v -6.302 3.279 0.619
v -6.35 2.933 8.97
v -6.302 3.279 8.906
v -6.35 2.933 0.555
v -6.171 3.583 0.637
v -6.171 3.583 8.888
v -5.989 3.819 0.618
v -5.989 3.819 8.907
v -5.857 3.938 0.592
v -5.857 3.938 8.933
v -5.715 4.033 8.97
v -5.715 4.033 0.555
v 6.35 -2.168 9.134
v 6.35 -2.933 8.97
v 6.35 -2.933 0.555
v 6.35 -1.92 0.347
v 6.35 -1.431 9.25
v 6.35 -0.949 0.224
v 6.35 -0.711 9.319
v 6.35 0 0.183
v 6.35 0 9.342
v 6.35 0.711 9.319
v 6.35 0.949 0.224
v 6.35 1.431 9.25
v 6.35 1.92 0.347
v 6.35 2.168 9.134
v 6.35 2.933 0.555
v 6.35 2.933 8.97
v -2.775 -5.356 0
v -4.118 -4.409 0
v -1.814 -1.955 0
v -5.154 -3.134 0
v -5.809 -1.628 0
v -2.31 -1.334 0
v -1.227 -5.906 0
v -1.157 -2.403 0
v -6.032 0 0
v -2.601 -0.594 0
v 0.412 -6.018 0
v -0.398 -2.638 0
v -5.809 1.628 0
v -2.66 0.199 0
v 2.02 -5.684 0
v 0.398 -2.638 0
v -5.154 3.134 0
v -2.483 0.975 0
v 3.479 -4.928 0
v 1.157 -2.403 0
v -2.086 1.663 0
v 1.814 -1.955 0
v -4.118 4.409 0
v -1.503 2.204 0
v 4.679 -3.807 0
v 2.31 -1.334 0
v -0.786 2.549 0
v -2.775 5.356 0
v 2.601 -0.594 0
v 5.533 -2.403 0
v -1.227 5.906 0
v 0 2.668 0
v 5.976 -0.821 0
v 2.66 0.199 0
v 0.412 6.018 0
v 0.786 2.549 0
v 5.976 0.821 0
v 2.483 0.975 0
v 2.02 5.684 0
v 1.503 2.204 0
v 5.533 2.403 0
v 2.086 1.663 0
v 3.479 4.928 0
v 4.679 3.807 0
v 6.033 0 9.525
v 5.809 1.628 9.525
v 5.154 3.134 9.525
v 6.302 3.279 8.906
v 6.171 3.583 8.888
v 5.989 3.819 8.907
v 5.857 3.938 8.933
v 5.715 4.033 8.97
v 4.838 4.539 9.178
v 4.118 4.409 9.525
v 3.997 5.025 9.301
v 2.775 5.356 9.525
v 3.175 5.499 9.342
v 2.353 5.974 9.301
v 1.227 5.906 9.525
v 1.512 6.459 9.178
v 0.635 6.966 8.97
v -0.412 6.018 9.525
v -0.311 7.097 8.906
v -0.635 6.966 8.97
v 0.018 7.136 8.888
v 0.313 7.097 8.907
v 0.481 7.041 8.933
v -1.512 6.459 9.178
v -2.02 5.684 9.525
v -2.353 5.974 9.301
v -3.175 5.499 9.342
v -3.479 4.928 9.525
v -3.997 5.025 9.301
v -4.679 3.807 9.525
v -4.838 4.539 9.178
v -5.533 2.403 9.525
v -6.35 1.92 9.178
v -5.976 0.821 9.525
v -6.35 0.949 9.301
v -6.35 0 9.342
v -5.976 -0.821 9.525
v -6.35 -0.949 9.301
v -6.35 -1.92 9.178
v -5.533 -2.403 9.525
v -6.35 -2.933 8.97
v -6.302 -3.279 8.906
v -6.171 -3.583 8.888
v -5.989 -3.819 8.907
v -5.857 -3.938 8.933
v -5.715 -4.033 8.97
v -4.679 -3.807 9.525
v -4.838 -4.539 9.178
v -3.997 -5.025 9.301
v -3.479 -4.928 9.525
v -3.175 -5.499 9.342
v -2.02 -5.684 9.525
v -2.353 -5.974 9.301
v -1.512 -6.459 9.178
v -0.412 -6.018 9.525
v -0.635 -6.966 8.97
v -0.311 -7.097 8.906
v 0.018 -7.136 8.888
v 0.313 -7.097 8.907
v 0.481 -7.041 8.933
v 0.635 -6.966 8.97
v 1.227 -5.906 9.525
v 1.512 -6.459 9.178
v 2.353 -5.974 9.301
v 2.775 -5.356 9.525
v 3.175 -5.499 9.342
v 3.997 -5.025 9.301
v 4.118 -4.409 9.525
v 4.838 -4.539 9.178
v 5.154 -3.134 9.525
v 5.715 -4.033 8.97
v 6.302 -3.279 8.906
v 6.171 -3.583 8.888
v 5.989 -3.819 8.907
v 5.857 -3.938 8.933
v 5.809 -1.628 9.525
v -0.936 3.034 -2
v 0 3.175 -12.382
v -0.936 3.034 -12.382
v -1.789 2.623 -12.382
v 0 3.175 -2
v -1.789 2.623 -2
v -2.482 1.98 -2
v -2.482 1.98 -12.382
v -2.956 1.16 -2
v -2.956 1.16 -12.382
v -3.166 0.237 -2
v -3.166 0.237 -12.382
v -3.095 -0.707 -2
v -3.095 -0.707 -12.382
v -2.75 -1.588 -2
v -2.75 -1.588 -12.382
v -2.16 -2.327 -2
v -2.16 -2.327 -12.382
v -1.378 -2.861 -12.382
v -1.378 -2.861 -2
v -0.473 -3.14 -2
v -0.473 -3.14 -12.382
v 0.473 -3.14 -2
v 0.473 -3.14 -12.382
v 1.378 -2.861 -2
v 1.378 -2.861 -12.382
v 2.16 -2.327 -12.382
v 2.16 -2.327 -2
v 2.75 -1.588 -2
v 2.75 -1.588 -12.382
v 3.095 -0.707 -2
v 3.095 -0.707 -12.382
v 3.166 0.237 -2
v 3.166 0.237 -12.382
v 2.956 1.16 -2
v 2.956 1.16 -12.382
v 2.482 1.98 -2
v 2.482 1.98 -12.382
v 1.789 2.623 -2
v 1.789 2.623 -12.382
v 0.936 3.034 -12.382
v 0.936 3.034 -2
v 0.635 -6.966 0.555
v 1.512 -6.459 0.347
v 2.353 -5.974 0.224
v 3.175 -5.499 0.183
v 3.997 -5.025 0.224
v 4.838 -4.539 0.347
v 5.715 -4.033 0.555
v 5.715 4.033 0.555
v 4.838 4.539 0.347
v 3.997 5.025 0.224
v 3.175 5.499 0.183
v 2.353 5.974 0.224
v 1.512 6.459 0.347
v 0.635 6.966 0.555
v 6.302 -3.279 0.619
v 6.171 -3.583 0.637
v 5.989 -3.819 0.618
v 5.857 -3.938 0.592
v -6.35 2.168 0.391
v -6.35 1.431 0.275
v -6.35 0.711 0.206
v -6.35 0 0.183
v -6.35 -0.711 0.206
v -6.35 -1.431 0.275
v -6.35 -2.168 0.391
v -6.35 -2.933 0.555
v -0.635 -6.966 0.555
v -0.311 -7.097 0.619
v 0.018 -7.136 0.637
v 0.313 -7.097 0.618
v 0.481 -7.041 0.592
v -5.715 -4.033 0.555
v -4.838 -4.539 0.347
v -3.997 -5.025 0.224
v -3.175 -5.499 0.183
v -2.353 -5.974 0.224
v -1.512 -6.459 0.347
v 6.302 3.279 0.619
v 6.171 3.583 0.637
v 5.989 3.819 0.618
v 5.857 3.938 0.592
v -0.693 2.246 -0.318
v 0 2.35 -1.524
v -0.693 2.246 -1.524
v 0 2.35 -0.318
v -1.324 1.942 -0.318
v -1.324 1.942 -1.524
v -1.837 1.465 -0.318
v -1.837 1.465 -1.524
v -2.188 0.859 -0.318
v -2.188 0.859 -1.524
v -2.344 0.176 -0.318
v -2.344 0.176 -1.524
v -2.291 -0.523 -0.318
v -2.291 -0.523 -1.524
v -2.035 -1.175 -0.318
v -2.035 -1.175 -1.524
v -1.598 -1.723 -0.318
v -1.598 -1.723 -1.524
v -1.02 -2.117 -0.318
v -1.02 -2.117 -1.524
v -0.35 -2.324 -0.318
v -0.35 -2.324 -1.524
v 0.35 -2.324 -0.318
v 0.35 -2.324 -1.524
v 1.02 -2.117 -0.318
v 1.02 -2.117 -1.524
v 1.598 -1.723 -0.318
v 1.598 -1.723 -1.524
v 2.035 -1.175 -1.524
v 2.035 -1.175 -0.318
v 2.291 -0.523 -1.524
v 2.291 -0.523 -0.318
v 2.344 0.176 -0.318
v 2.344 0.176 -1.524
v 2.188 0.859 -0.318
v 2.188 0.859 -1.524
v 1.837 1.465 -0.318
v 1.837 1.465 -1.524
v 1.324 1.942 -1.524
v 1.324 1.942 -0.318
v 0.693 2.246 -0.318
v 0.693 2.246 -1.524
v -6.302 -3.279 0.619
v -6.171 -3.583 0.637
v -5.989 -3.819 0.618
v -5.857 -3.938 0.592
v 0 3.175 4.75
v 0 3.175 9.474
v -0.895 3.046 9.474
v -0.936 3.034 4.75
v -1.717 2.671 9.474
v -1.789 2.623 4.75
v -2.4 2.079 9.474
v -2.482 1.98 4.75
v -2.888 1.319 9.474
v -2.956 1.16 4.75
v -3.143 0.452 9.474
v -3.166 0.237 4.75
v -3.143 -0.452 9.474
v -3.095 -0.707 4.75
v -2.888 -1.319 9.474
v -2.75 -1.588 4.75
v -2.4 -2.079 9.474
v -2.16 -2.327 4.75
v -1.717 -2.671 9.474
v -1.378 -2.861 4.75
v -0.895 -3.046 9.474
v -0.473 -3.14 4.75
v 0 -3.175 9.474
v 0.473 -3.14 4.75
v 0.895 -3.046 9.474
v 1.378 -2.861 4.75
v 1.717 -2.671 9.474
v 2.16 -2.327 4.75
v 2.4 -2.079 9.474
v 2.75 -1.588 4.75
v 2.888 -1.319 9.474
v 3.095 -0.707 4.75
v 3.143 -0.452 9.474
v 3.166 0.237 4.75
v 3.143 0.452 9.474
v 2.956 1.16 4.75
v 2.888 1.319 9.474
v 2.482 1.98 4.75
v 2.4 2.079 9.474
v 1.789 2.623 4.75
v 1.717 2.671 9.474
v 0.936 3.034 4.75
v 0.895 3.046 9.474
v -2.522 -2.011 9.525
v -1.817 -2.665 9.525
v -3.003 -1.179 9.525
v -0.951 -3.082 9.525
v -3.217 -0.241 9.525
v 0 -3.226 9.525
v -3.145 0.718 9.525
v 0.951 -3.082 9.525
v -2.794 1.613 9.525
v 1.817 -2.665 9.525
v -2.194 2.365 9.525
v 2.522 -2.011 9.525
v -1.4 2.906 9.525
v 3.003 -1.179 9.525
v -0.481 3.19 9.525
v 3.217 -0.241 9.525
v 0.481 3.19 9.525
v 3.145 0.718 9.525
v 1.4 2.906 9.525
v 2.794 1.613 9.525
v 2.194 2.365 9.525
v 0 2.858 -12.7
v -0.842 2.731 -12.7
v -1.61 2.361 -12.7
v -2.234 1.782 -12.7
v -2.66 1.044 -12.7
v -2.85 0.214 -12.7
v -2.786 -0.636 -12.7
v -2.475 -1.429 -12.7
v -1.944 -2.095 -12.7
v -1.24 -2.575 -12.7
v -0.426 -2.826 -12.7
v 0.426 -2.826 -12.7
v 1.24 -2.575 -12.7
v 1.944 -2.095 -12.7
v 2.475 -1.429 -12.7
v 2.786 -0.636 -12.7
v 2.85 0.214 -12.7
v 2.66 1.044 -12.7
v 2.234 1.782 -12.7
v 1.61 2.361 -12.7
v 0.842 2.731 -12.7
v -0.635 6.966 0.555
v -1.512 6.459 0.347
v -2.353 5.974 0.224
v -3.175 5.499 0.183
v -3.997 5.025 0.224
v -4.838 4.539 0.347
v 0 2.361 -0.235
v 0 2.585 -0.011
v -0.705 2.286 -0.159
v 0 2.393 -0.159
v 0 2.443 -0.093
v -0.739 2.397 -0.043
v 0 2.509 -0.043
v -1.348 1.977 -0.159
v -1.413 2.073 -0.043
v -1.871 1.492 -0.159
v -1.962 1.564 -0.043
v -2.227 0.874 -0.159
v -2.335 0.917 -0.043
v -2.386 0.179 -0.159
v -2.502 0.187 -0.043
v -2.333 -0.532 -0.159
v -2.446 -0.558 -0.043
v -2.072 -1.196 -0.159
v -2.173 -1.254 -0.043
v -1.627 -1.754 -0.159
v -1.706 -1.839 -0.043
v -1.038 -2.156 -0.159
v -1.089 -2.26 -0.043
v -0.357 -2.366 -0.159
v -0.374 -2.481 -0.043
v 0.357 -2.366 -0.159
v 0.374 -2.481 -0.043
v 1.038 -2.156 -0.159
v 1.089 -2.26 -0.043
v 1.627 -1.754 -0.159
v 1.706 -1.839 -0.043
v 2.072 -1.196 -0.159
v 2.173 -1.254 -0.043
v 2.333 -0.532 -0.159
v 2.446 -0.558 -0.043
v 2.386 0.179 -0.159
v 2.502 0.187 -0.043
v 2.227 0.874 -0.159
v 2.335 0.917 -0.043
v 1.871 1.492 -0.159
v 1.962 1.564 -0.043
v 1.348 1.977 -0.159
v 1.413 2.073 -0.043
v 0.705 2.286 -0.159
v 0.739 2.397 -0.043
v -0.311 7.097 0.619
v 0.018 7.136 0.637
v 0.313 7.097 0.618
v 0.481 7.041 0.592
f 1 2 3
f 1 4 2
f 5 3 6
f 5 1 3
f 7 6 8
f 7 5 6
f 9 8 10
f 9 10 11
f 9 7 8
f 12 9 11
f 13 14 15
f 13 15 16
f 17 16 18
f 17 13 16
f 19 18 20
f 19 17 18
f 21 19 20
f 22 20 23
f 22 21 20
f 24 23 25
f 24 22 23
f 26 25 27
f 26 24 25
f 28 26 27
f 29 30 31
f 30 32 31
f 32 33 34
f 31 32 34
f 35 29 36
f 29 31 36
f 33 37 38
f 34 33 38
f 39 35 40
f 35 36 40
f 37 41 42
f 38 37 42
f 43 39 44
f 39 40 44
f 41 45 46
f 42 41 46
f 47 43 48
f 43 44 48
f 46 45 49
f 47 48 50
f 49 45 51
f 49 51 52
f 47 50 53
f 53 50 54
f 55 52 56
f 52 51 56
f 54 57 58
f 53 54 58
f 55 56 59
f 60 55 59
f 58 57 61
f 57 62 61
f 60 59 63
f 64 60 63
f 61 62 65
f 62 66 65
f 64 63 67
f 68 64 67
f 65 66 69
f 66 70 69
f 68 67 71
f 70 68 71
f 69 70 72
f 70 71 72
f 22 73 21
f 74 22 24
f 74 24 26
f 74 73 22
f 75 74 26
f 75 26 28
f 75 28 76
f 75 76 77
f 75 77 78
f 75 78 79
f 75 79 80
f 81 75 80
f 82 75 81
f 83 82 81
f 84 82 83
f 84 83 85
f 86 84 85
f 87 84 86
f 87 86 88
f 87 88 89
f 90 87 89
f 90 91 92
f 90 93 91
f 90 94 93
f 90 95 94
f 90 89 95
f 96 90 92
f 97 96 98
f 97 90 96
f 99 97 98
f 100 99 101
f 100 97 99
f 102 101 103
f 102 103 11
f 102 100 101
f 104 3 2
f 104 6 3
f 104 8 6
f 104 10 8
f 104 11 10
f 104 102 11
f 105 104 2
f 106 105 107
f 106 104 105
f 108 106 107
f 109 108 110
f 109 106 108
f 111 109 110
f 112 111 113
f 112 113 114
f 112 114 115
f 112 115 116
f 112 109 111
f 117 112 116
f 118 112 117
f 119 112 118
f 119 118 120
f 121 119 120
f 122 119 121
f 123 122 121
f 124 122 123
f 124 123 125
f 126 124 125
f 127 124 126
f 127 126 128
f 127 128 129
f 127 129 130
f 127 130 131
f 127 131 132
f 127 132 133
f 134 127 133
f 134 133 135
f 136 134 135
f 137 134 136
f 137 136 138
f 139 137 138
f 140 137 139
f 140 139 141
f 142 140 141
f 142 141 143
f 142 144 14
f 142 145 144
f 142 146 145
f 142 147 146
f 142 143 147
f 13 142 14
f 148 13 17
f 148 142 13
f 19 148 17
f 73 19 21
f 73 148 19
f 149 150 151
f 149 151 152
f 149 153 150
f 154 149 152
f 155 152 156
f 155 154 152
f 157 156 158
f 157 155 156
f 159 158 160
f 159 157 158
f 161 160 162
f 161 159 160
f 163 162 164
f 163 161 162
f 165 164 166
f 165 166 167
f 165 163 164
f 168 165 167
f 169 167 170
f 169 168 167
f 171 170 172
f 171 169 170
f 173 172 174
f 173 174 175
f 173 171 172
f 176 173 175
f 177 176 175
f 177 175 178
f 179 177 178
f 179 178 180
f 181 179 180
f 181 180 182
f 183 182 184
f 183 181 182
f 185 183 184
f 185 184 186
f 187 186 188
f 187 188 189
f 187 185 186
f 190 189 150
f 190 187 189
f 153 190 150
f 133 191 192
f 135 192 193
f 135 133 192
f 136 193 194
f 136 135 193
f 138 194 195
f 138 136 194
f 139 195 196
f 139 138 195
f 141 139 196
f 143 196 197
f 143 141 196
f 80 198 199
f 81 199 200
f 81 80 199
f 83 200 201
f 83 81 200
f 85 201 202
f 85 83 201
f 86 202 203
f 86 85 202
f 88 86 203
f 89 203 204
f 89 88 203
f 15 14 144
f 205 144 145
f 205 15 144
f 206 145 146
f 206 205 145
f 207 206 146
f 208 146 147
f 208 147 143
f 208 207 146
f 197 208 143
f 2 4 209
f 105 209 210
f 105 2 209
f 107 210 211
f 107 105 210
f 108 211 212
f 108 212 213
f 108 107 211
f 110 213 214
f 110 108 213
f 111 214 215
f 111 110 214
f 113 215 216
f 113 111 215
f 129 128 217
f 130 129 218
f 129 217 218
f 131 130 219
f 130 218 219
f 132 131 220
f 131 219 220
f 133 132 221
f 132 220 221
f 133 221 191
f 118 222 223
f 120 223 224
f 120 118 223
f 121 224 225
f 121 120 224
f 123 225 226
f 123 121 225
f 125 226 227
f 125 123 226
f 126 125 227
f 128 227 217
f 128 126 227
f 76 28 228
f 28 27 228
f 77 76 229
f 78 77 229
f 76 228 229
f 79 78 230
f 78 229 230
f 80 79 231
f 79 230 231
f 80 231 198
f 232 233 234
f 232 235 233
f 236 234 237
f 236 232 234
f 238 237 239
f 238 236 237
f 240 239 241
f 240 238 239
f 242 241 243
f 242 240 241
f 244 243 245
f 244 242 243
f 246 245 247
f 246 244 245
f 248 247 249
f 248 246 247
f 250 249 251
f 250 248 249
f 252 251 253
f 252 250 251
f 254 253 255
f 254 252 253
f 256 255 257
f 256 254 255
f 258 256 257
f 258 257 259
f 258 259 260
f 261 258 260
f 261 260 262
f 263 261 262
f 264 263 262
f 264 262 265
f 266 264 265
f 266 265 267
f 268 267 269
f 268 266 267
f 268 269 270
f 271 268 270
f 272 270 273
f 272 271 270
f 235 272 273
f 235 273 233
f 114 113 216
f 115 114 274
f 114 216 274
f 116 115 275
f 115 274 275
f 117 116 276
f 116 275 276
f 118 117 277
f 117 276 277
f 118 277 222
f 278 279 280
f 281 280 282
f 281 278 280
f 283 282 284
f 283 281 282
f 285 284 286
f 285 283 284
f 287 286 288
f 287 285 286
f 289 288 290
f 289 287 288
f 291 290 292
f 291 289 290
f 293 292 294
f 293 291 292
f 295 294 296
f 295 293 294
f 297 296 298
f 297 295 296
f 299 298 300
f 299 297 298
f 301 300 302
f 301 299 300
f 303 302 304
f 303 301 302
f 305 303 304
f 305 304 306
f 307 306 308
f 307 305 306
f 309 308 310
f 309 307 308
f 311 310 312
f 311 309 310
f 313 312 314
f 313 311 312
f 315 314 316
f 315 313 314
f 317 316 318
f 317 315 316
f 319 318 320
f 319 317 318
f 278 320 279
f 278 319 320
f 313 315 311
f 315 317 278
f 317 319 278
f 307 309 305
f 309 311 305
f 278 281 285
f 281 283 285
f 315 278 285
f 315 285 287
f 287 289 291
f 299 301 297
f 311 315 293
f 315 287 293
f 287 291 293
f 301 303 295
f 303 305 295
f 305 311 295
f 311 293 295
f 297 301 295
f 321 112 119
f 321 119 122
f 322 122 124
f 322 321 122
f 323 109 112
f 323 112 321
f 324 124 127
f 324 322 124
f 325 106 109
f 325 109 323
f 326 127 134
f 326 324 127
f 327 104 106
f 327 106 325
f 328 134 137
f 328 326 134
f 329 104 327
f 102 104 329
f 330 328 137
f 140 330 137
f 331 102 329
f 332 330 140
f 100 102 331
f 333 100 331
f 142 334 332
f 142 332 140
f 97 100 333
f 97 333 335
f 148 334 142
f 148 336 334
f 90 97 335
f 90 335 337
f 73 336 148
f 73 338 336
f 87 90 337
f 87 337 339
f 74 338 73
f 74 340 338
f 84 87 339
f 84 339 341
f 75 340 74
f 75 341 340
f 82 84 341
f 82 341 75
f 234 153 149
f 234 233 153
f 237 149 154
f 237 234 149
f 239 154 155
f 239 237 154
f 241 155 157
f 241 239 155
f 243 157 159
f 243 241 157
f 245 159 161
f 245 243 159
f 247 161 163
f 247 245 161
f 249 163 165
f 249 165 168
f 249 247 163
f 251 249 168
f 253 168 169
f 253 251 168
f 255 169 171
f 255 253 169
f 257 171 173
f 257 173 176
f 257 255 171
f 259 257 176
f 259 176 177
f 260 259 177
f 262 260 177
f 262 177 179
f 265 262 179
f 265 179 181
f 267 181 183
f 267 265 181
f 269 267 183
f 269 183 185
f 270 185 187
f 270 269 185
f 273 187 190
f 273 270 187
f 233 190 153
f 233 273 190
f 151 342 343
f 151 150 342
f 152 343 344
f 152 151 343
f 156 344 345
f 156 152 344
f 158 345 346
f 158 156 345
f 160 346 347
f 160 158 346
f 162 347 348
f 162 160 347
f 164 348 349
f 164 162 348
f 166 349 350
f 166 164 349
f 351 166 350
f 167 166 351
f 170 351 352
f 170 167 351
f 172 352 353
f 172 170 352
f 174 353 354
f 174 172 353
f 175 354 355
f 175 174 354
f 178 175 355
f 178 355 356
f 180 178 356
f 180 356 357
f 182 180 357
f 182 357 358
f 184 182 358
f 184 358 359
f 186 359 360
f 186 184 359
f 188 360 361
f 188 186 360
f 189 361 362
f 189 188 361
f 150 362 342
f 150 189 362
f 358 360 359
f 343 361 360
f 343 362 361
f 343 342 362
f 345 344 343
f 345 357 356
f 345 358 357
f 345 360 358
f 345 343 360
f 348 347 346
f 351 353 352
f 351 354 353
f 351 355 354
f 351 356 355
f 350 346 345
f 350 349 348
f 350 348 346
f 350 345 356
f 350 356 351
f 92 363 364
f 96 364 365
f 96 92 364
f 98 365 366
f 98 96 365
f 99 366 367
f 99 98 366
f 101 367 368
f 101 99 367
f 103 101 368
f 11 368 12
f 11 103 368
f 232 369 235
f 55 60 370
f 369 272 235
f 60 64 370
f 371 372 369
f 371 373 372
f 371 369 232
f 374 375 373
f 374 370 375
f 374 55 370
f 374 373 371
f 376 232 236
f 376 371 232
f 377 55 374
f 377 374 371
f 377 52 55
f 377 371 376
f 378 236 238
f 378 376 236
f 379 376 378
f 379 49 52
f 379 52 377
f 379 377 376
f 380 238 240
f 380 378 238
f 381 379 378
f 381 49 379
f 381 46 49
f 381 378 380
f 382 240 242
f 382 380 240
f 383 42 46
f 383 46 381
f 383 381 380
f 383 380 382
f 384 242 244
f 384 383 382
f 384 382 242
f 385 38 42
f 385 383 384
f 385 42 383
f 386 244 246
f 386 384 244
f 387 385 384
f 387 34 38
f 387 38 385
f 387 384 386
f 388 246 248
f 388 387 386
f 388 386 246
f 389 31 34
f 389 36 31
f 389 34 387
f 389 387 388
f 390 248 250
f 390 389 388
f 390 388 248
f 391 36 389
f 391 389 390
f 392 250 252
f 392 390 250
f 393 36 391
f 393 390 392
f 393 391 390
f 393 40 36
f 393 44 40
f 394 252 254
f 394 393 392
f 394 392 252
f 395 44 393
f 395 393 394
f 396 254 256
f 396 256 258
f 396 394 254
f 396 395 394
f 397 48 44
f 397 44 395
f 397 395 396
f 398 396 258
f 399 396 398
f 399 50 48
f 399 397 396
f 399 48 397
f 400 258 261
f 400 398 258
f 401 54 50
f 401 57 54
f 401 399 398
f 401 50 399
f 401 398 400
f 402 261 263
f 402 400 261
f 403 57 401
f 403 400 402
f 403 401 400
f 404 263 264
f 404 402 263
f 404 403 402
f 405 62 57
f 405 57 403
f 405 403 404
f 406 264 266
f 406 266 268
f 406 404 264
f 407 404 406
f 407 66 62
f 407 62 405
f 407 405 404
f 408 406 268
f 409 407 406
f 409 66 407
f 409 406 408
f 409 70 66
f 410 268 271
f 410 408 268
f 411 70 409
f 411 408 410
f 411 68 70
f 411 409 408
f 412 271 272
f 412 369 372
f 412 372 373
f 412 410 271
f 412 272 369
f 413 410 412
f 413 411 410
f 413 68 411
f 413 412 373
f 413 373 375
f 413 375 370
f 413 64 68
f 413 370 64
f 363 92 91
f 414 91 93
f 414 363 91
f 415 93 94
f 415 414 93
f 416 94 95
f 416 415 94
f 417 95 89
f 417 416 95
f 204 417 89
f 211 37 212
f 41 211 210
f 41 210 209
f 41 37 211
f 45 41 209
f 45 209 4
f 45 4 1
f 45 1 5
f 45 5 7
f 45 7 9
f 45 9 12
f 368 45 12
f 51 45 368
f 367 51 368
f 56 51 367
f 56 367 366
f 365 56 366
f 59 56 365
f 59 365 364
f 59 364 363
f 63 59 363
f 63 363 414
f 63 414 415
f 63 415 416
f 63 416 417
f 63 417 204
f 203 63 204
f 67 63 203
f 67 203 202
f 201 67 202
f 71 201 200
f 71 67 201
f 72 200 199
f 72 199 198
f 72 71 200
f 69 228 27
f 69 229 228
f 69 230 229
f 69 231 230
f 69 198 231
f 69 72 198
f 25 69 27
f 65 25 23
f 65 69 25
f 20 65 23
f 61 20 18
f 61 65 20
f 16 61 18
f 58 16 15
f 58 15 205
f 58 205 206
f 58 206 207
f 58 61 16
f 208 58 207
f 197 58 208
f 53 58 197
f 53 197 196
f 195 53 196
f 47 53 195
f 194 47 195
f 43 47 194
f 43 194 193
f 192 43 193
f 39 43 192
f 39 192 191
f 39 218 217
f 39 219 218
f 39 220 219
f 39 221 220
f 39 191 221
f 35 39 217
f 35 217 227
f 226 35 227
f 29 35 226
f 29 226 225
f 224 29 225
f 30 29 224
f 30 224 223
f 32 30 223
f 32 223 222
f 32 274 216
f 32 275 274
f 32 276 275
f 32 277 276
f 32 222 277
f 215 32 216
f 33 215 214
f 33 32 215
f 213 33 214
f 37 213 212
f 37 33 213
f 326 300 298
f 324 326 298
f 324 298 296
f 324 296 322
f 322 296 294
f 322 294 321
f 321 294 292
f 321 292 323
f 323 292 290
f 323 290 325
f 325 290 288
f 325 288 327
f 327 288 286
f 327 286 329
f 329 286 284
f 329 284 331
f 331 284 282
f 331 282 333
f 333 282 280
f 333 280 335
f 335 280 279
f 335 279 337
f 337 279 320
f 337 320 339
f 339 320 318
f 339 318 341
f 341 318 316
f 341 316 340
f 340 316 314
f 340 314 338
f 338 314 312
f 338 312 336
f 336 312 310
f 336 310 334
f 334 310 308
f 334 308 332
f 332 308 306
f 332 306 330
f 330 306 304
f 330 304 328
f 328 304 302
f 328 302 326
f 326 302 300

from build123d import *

# Parameters (mm, degrees)
SKETCH4_R           = 4.7625
BOSS_EXTRUDE1_DEPTH = 9.525
SKETCH5_OUTSIDE_W   = 108.066
SKETCH5_OUTSIDE_H   = 110.03
SKETCH5_OUTSIDE_R   = 6.0325
CUT_EXTRUDE1_DEPTH  = 25.249463052
CUT_EXTRUDE1_DRAFT  = -60
SKETCH6_OUTSIDE_W   = 79.422
SKETCH6_OUTSIDE_H   = 81.386
SKETCH6_OUTSIDE_R   = 6.0325
CUT_EXTRUDE2_DEPTH  = 16.980482888
CUT_EXTRUDE2_DRAFT  = -60
FILLET1_R           = 1.27
SKETCH9_R           = 3.4925
BOSS_EXTRUDE2_DEPTH = 4.7752
SKETCH10_W          = 4.7752
SKETCH10_H          = 3.175


with BuildPart() as part:
    # Sketch3 → Revolve1 (revolve)
    with BuildSketch(Plane(origin=(0, 0, 0), x_dir=(0, 0, -1), z_dir=(1, 0, 0))):
        with BuildLine():
            Line((-4.7498, 2.8575), (-4.7498, 0))
            Line((-4.7498, 0), (12.7, 0))
            Line((12.7, 0), (12.7, 2.8575))
            Line((12.7, 2.8575), (12.3825, 3.175))
            Line((12.3825, 3.175), (2.00025, 3.175))
            Line((2.00025, 3.175), (1.524, 2.350110803))
            Line((1.524, 2.350110803), (0.3175, 2.350110803))
            ThreePointArc((0.3175, 2.350110803), (0.092993597, 2.4431044), (0, 2.667610803))
            Line((0, 2.667610803), (0, 6.35))
            Line((0, 6.35), (-9.525, 6.35))
            Line((-9.525, 6.35), (-9.525, 3.4925))
            Line((-9.525, 3.4925), (-9.2075, 3.175))
            Line((-9.2075, 3.175), (-5.0673, 3.175))
            Line((-5.0673, 3.175), (-4.7498, 2.8575))
        make_face()
    revolve(axis=Axis((0, 0, -12.7), (0, 0, 1)))

    # Sketch4 → Boss-Extrude1 (add)
    with BuildSketch(Plane.XY.offset(9.525)):
        Polygon((-6.35, 3.666174209), (-6.35, -3.666174209), (0, -7.332348419), (6.35, -3.666174209), (6.35, 3.666174209), (0, 7.332348419), align=None)
        Circle(SKETCH4_R, mode=Mode.SUBTRACT)
    extrude(amount=-BOSS_EXTRUDE1_DEPTH)


with BuildPart() as cut_extrude1_tool:
    # Sketch5 outside → Cut-Extrude1 (with draft: the straight prism first)
    with BuildSketch(Plane.XY.offset(9.525)):
        Rectangle(SKETCH5_OUTSIDE_W, SKETCH5_OUTSIDE_H)
        Circle(SKETCH5_OUTSIDE_R, mode=Mode.SUBTRACT)
    extrude(amount=-CUT_EXTRUDE1_DEPTH)
    # Cut-Extrude1: the draft: its side faces are tilted about the plane it starts from
    cut_extrude1_sides = [cut_extrude1_tool.faces().sort_by_distance(p)[0] for p in [
        (0, -55.015, -3.099731526),
        (54.033, 0, -3.099731526),
        (0, 55.015, -3.099731526),
        (-54.033, 0, -3.099731526),
        (-6.0325, 0, -3.099731526),
    ]]
    draft(cut_extrude1_sides, Plane.XY.offset(9.525), CUT_EXTRUDE1_DRAFT)


with BuildPart() as part_1:
    add(part.part)

    # Cut-Extrude1: cut by cut_extrude1_tool
    add(cut_extrude1_tool.part, mode=Mode.SUBTRACT)


with BuildPart() as cut_extrude2_tool:
    # Sketch6 outside → Cut-Extrude2 (with draft: the straight prism first)
    with BuildSketch(Plane(origin=(0, 0, 0), x_dir=(-1, 0, 0), z_dir=(0, 0, -1))):
        Rectangle(SKETCH6_OUTSIDE_W, SKETCH6_OUTSIDE_H)
        Circle(SKETCH6_OUTSIDE_R, mode=Mode.SUBTRACT)
    extrude(amount=-CUT_EXTRUDE2_DEPTH)
    # Cut-Extrude2: the draft: its side faces are tilted about the plane it starts from
    cut_extrude2_sides = [cut_extrude2_tool.faces().sort_by_distance(p)[0] for p in [
        (0, -40.693, 8.490241444),
        (-39.711, 0, 8.490241444),
        (0, 40.693, 8.490241444),
        (39.711, 0, 8.490241444),
        (6.0325, 0, 8.490241444),
    ]]
    draft(cut_extrude2_sides, Plane(origin=(0, 0, 0), x_dir=(-1, 0, 0), z_dir=(0, 0, -1)), CUT_EXTRUDE2_DRAFT)


with BuildPart() as part_2:
    add(part_1.part)

    # Cut-Extrude2: cut by cut_extrude2_tool
    add(cut_extrude2_tool.part, mode=Mode.SUBTRACT)

    # Fillet1
    fillet1_edges = [part_2.edges().sort_by_distance(p)[0] for p in [
        (0, 7.332348419, 4.7625),
        (-6.35, -3.666174209, 4.7625),
        (0, -7.332348419, 4.7625),
        (6.35, -3.666174209, 4.7625),
        (6.35, 3.666174209, 4.7625),
        (-6.35, 3.666174209, 4.7625),
    ]]
    fillet(fillet1_edges, radius=FILLET1_R)

    # Sketch9 → Boss-Extrude2 (add)
    with BuildSketch(Plane.XY.offset(4.7498)):
        Circle(SKETCH9_R)
    extrude(amount=BOSS_EXTRUDE2_DEPTH)


with BuildPart() as body_2:
    # Sketch10 → Revolve2 (revolve)
    with BuildSketch(Plane(origin=(0, 0, 0), x_dir=(0, 0, -1), z_dir=(1, 0, 0))):
        with Locations((-7.1374, 1.5875)):
            Rectangle(SKETCH10_W, SKETCH10_H)
    revolve(axis=Axis((0, 0, -12.7), (0, 0, 1)))


with BuildPart() as part_3:
    add(part_2.part)

    # Combine1: cut body 2
    add(body_2.part, mode=Mode.SUBTRACT)

    # Cut-Extrude3 cone 1 section (through the dimple's axis) → Cut-Extrude3 (revolve, cut)
    with BuildSketch(Plane(origin=(0, 0, 9.525), x_dir=(0, -1, 0), z_dir=(1, 0, 0))):
        Polygon((0, 0), (3.2258, 0), (0, 3.2258), align=None)
    revolve(axis=Axis((0, 0, 9.525), (0, 0, -1)), mode=Mode.SUBTRACT)


solid = part_3.part
